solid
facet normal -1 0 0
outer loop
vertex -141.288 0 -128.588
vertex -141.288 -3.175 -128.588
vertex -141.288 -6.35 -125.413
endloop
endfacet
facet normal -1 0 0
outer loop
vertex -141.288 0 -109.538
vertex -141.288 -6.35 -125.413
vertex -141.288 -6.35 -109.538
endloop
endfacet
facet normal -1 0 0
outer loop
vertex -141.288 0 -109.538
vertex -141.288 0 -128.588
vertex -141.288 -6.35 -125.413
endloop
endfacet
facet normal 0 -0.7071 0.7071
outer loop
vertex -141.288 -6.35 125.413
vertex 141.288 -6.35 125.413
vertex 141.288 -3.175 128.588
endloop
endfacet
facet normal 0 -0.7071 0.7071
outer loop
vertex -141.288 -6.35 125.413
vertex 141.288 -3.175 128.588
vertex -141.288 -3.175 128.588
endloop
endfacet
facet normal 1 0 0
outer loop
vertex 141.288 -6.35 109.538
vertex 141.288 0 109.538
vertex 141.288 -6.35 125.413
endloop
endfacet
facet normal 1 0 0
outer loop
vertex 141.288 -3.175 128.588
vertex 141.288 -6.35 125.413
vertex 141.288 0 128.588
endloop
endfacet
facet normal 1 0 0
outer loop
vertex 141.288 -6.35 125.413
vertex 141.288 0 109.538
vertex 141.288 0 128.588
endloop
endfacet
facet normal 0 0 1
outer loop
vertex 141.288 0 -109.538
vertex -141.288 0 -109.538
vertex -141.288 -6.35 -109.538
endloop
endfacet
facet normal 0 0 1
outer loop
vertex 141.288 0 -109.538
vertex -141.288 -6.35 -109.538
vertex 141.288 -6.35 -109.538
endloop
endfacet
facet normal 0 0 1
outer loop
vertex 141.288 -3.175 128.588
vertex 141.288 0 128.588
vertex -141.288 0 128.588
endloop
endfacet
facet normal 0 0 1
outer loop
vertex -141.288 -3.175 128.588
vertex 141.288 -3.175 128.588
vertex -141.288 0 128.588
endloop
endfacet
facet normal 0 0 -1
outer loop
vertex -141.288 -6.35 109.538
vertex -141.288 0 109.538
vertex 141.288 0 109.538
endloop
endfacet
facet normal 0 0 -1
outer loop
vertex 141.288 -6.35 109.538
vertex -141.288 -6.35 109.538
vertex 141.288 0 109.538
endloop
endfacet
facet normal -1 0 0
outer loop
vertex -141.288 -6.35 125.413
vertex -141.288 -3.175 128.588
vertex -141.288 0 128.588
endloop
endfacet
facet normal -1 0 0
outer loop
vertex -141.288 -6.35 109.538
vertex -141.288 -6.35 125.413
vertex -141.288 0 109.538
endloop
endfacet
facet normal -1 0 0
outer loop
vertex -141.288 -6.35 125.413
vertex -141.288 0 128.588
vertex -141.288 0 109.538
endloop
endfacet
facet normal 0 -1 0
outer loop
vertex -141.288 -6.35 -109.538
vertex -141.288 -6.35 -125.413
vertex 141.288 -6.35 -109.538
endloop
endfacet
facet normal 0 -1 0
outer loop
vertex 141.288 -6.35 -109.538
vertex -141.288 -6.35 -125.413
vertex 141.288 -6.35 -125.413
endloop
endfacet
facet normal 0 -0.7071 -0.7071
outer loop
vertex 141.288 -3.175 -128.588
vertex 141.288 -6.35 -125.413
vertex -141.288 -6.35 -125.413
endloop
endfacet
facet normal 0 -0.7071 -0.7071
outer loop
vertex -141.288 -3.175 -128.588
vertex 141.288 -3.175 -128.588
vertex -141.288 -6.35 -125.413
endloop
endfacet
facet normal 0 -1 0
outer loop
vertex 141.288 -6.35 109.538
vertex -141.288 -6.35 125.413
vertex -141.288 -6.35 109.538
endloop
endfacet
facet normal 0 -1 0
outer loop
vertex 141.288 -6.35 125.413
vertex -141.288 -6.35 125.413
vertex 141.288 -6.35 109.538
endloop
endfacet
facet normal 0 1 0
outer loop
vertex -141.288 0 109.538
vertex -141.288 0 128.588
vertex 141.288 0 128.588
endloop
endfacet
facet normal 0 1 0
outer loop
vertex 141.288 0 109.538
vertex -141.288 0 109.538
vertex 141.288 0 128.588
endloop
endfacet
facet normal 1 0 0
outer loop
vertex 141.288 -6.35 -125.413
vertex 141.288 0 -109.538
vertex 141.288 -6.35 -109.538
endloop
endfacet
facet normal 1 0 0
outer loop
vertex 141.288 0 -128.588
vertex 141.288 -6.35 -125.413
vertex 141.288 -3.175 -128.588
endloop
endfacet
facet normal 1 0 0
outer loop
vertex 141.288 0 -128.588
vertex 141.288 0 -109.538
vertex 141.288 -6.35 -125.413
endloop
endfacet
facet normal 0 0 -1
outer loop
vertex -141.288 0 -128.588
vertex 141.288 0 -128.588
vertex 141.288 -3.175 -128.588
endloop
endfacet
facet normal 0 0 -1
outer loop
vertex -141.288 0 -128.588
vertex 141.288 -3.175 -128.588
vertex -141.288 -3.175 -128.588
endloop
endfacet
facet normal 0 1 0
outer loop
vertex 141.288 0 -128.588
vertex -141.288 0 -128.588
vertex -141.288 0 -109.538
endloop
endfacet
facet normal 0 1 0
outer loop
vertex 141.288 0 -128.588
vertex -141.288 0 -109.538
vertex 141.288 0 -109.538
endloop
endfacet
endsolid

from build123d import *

# Parameters (mm, degrees)
F1_DEPTH = 6.35
F2_SIZE  = 3.175


with BuildPart() as f1:
    # F0 (on Front) → F1 (new body)
    with BuildSketch(Plane.XZ):
        Polygon((-50.684446, 128.5875), (-141.2875, 128.5875), (-141.2875, 109.5375), (141.2875, 109.5375), (141.2875, 128.5875), (0, 128.5875), align=None)
    extrude(amount=F1_DEPTH)

    # F2
    f2_edges = [f1.edges().sort_by_distance(p)[0] for p in [
        (0, -6.35, 128.5875),
    ]]
    chamfer(f2_edges, length=F2_SIZE)


with BuildPart() as f3_1:
    # F3: instance of F1
    add(f1.part.mirror(Plane.XY))


solid = Compound([f1.part, f3_1.part])
